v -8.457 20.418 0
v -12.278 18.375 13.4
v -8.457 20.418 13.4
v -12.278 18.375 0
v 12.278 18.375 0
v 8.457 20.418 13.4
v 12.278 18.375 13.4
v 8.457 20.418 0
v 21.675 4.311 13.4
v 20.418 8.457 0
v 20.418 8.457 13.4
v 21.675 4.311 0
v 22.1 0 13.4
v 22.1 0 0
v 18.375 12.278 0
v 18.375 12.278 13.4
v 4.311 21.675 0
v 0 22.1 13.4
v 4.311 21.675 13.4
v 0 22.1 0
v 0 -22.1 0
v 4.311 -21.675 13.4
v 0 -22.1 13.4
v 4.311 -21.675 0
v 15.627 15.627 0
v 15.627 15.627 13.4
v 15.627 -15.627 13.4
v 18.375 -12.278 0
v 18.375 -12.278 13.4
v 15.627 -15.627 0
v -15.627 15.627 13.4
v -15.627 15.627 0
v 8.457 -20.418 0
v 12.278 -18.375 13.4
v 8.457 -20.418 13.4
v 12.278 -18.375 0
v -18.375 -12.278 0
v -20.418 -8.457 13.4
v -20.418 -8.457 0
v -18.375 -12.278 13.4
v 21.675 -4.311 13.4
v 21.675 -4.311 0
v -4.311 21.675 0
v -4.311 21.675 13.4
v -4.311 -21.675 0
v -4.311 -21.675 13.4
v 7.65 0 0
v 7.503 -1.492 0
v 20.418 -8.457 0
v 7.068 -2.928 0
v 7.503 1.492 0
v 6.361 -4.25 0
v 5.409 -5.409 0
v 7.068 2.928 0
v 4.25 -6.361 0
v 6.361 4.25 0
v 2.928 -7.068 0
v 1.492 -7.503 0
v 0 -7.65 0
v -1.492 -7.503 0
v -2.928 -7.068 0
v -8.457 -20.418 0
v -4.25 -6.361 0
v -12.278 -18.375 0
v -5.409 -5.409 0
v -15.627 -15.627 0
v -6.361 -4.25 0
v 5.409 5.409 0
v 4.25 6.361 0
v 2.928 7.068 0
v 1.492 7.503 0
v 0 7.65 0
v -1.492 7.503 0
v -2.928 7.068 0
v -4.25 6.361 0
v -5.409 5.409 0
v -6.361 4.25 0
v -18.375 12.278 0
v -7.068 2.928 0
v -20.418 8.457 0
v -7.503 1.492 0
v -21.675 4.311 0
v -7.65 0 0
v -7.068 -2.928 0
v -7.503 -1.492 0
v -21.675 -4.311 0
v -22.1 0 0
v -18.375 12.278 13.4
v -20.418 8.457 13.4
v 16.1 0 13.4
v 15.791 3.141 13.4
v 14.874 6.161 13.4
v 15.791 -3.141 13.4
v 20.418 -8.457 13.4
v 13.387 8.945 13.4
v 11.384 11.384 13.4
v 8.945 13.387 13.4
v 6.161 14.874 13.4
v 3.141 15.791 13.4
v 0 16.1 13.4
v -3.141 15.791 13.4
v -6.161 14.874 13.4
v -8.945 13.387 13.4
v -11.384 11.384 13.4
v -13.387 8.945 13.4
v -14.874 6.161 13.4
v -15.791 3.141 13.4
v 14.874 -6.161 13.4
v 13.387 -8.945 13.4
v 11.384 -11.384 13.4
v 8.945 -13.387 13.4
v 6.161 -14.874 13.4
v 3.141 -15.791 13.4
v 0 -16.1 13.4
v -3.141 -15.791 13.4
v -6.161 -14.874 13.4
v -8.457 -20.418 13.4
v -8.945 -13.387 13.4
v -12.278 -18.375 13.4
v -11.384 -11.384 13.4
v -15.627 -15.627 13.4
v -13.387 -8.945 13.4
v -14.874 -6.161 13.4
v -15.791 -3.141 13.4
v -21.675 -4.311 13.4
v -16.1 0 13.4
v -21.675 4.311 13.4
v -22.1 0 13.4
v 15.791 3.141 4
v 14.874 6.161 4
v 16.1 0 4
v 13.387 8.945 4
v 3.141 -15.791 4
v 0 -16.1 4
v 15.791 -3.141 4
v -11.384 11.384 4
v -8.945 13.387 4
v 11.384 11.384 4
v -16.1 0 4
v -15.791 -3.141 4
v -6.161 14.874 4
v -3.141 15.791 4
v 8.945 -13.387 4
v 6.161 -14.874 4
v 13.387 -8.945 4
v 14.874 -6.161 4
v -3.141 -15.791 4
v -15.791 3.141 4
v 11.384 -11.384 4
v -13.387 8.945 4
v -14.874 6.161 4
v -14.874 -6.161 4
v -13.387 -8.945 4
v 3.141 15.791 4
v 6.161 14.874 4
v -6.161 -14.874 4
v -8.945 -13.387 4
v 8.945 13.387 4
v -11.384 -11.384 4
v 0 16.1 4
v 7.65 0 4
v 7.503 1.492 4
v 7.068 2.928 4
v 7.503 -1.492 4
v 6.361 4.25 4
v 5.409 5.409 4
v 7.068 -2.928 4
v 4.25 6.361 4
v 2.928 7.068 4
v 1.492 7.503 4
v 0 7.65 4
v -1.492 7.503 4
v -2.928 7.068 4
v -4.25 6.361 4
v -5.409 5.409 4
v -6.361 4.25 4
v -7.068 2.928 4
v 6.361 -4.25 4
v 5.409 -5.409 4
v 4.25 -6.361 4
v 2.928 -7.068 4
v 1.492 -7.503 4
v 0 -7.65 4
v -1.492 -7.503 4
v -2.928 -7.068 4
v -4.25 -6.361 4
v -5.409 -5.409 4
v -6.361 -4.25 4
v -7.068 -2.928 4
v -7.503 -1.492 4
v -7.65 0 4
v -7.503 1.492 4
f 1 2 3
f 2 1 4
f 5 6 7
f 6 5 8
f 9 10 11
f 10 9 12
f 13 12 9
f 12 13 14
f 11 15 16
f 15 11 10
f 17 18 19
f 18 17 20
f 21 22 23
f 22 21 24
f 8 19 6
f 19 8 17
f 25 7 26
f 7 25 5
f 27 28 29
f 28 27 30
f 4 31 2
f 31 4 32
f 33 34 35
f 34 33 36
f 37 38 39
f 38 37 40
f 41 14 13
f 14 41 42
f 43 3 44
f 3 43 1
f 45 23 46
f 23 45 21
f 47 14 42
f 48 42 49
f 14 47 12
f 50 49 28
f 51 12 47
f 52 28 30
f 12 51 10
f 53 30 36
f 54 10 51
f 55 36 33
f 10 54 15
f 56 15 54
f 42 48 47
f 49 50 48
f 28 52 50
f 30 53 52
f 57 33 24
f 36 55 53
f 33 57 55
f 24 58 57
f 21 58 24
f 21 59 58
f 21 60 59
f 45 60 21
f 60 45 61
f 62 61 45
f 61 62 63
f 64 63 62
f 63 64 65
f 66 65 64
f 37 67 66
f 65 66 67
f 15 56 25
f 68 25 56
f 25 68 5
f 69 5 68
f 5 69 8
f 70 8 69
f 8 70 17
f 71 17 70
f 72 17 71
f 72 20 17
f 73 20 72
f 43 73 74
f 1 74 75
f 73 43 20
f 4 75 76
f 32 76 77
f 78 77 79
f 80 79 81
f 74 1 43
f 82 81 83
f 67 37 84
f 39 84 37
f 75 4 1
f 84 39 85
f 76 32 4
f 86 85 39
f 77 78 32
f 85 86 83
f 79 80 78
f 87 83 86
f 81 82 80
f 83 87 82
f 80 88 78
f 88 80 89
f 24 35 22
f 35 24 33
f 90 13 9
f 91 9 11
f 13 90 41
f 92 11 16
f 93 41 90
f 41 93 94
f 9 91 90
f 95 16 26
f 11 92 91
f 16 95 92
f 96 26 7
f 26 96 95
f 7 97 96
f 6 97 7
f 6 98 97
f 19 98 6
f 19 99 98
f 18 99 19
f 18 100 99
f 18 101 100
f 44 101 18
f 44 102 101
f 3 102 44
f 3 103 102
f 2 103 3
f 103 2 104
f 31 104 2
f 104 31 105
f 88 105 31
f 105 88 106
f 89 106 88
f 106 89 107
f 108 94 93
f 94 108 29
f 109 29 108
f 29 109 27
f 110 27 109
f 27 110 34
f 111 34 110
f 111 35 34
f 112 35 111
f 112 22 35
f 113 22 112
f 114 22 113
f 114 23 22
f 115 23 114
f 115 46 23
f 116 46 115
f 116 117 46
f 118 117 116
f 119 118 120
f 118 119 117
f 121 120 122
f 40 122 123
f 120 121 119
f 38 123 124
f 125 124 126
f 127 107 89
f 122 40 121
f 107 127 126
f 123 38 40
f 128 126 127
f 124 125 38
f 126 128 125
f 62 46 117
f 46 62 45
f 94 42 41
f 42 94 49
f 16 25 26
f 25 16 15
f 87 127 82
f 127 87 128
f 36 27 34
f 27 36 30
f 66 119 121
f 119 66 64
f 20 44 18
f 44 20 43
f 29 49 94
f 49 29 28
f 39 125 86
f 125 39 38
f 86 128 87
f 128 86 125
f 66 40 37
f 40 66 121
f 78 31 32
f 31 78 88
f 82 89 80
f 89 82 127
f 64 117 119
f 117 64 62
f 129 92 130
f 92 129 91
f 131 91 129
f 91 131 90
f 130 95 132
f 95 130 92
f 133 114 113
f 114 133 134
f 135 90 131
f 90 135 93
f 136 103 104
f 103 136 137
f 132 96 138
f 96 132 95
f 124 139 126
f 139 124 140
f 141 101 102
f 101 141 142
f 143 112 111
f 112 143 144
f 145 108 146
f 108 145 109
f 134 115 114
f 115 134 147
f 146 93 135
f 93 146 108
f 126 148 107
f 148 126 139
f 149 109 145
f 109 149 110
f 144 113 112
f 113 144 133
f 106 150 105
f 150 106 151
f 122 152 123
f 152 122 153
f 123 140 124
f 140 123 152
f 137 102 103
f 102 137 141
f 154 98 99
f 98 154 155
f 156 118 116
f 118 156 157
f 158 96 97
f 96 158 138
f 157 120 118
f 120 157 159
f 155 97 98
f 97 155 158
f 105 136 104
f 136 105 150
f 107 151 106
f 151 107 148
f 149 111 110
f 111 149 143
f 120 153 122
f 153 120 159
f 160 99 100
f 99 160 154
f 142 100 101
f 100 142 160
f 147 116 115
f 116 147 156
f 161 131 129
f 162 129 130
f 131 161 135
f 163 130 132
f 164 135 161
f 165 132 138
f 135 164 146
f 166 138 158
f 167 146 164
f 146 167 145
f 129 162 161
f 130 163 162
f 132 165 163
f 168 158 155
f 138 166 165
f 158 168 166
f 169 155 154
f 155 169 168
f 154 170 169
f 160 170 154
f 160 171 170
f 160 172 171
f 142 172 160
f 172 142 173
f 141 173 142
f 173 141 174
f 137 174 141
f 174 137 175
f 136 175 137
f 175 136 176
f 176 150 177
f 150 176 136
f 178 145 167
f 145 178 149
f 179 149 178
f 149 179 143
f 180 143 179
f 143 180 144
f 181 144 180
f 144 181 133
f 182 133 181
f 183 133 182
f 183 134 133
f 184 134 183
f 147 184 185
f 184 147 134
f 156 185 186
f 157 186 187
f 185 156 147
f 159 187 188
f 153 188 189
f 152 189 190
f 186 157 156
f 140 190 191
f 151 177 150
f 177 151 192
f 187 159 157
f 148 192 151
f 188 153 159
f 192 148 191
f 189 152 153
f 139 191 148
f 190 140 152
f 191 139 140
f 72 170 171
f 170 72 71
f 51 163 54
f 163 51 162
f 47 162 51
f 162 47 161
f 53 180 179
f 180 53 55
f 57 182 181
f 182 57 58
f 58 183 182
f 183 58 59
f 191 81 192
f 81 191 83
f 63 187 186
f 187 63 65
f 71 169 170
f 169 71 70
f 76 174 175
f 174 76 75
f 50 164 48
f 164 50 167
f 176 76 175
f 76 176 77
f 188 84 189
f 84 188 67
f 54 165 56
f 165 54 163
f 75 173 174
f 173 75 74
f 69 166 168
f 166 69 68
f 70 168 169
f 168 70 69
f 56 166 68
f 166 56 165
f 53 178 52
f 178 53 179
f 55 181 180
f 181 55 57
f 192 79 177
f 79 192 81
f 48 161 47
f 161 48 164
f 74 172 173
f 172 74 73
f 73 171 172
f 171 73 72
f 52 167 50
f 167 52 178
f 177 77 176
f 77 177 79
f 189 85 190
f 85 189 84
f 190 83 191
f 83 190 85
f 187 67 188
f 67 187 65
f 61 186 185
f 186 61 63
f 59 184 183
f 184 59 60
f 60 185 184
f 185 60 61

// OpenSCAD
$fn = 32;

// ----------------------------------------------------------------------
// Bearing housing: seat for 6002 (32 x 9 mm), 44.2 mm body
// ----------------------------------------------------------------------

// --- parameters (mm) ---
case_d = 44.2;            // housing outside diameter
case_h = 13.4;            // overall housing height
rim_t = 6;                // wall thickness
bearing_seat = 32.2;      // 6002 seat, 0.2 mm clearance
seat_h = 9.4;             // pocket depth
shoulder = 4;             // shoulder under the bearing
pass_d = 15.3;            // shaft passage

module body() {
  cylinder(h = case_h, d = case_d);
}

difference() {
  union() {
    body();
  }
  translate([0, 0, case_h - seat_h]) cylinder(h = seat_h + 1, d = bearing_seat);
  translate([0, 0, -1]) cylinder(h = case_h - seat_h + 1, d = pass_d);
}
